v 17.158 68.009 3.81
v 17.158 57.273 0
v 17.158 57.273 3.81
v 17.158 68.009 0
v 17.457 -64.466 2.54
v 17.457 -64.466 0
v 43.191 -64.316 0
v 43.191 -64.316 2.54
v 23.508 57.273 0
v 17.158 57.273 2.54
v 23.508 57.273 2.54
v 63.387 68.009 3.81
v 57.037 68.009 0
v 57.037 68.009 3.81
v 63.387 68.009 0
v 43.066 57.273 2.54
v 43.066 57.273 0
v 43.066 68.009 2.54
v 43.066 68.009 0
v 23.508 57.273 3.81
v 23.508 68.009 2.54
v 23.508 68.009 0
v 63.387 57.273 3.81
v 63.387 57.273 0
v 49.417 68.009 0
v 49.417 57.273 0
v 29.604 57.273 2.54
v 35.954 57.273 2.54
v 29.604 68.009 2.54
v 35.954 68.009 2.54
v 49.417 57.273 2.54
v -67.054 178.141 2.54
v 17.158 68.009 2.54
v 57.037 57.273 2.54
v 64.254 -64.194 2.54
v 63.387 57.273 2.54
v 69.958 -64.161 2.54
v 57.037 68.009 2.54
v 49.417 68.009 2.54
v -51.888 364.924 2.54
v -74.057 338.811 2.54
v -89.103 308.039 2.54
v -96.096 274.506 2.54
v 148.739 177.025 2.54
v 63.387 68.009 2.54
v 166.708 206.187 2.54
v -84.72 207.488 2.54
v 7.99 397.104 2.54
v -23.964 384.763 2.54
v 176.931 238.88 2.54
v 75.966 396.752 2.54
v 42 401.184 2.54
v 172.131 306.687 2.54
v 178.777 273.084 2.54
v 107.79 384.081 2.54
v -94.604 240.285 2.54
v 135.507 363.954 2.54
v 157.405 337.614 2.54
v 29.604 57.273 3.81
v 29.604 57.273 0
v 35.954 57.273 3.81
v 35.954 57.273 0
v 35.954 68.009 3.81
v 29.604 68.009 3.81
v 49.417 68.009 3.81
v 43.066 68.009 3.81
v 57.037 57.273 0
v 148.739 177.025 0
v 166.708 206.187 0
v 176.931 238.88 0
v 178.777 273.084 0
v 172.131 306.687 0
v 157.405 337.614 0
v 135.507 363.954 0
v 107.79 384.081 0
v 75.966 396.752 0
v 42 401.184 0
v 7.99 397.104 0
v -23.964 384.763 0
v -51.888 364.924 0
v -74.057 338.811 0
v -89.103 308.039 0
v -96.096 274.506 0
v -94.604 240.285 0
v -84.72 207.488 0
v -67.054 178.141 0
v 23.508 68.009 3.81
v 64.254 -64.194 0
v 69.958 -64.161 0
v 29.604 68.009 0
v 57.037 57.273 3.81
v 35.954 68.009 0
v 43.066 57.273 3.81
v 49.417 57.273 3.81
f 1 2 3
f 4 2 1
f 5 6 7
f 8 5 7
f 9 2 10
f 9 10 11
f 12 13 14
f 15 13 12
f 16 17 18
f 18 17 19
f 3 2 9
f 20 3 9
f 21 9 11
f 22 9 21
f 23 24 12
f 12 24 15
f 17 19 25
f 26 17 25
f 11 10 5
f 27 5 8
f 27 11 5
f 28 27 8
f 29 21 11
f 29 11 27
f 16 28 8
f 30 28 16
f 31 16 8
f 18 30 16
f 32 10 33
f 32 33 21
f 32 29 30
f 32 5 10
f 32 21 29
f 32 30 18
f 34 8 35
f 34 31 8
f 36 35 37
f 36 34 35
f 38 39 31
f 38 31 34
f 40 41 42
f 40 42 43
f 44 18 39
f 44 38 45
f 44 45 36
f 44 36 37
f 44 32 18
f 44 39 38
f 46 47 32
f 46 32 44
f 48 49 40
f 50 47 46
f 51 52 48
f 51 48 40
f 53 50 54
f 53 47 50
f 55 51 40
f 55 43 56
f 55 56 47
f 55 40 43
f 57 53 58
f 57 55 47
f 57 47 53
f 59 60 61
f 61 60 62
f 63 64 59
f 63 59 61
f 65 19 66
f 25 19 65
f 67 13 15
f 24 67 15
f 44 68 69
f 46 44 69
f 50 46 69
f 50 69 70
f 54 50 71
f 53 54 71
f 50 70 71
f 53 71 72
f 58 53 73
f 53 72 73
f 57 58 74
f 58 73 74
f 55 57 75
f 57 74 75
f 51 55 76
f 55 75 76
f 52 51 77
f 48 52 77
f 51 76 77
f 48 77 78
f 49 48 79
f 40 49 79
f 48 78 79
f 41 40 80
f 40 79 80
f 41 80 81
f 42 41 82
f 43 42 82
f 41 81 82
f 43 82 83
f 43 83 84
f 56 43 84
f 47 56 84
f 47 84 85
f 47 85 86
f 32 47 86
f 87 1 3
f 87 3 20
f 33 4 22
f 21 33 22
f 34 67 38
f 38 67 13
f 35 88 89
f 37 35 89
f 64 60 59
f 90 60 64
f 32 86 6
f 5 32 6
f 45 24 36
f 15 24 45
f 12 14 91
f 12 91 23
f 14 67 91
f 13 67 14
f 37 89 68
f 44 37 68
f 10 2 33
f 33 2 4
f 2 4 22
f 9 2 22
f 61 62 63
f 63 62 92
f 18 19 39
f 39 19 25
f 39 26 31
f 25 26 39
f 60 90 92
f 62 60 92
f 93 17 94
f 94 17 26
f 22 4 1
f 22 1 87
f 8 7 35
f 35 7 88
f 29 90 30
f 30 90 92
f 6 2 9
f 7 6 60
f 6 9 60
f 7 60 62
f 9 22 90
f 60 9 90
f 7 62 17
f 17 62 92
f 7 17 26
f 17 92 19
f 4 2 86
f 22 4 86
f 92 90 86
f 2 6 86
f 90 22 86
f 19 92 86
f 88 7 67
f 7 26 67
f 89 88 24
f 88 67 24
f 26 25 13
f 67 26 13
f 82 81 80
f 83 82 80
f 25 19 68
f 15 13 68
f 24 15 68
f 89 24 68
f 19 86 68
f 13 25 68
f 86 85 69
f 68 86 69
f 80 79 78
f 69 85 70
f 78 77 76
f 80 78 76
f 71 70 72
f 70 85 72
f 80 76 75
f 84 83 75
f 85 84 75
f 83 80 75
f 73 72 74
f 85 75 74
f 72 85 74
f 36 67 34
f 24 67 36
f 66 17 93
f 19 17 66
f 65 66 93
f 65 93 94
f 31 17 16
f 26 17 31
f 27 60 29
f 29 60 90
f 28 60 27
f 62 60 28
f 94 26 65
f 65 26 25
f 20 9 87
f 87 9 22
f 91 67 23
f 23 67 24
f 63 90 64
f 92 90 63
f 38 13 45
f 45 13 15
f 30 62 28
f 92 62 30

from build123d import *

# Parameters (mm, degrees)
F0_W     = 6.3504016859
F0_H     = 10.7357241213
F5_DEPTH = 3.81
F6_DEPTH = 2.54


# Not quite as in the source:
# - the program builds the solid bodies; features that only make, move or delete a surface that nothing else refers to are left out


with BuildPart() as f5:
    # F0 (on Top) → F5 (new body)
    with BuildSketch(Plane.XY):
        with Locations((20.3327481219, 62.6413132995)):
            Rectangle(F0_W, F0_H)
    extrude(amount=F5_DEPTH)


with BuildPart() as f5b:
    # F0 (on Top) → F5, piece 2 (new body)
    with BuildSketch(Plane.XY):
        with Locations((32.7791477969, 62.6413132995)):
            Rectangle(F0_W, F0_H)
    extrude(amount=F5_DEPTH)


with BuildPart() as f5c:
    # F0 (on Top) → F5, piece 3 (new body)
    with BuildSketch(Plane.XY):
        with Locations((46.2415534487, 62.6413132995)):
            Rectangle(F0_W, F0_H)
    extrude(amount=F5_DEPTH)


with BuildPart() as f5d:
    # F0 (on Top) → F5, piece 4 (new body)
    with BuildSketch(Plane.XY):
        with Locations((60.2119545868, 62.6413132995)):
            Rectangle(F0_W, F0_H)
    extrude(amount=F5_DEPTH)


with BuildPart() as f6:
    # F0 (on Top) → F6 (new body)
    with BuildSketch(Plane.XY):
        with BuildLine():
            Line((69.9580198012, -64.1605830248), (148.7393677235, 177.0247817039))
            ThreePointArc((148.7393677235, 177.0247817039), (41.9997875967, 401.1840791368), (-67.0538321137, 178.141400218))
            Line((-67.0538321137, 178.141400218), (17.4566285457, -64.4657063324))
            Line((17.4566285457, -64.4657063324), (23.8170791066, -64.4287411841))
            Line((23.8170791066, -64.4287411841), (43.1908853352, -64.3161460757))
            Line((43.1908853352, -64.3161460757), (64.2538569655, -64.1937340135))
            Line((64.2538569655, -64.1937340135), (69.9580198012, -64.1605830248))
        make_face()
        with Locations((20.3327481219, 62.6413132995)):
            Rectangle(F0_W, F0_H, mode=Mode.SUBTRACT)
        with Locations((32.7791477969, 62.6413132995)):
            Rectangle(F0_W, F0_H, mode=Mode.SUBTRACT)
        with Locations((46.2415534487, 62.6413132995)):
            Rectangle(F0_W, F0_H, mode=Mode.SUBTRACT)
        with Locations((60.2119545868, 62.6413132995)):
            Rectangle(F0_W, F0_H, mode=Mode.SUBTRACT)
    extrude(amount=F6_DEPTH)


solid = Compound([f5.part, f5b.part, f5c.part, f5d.part, f6.part])
